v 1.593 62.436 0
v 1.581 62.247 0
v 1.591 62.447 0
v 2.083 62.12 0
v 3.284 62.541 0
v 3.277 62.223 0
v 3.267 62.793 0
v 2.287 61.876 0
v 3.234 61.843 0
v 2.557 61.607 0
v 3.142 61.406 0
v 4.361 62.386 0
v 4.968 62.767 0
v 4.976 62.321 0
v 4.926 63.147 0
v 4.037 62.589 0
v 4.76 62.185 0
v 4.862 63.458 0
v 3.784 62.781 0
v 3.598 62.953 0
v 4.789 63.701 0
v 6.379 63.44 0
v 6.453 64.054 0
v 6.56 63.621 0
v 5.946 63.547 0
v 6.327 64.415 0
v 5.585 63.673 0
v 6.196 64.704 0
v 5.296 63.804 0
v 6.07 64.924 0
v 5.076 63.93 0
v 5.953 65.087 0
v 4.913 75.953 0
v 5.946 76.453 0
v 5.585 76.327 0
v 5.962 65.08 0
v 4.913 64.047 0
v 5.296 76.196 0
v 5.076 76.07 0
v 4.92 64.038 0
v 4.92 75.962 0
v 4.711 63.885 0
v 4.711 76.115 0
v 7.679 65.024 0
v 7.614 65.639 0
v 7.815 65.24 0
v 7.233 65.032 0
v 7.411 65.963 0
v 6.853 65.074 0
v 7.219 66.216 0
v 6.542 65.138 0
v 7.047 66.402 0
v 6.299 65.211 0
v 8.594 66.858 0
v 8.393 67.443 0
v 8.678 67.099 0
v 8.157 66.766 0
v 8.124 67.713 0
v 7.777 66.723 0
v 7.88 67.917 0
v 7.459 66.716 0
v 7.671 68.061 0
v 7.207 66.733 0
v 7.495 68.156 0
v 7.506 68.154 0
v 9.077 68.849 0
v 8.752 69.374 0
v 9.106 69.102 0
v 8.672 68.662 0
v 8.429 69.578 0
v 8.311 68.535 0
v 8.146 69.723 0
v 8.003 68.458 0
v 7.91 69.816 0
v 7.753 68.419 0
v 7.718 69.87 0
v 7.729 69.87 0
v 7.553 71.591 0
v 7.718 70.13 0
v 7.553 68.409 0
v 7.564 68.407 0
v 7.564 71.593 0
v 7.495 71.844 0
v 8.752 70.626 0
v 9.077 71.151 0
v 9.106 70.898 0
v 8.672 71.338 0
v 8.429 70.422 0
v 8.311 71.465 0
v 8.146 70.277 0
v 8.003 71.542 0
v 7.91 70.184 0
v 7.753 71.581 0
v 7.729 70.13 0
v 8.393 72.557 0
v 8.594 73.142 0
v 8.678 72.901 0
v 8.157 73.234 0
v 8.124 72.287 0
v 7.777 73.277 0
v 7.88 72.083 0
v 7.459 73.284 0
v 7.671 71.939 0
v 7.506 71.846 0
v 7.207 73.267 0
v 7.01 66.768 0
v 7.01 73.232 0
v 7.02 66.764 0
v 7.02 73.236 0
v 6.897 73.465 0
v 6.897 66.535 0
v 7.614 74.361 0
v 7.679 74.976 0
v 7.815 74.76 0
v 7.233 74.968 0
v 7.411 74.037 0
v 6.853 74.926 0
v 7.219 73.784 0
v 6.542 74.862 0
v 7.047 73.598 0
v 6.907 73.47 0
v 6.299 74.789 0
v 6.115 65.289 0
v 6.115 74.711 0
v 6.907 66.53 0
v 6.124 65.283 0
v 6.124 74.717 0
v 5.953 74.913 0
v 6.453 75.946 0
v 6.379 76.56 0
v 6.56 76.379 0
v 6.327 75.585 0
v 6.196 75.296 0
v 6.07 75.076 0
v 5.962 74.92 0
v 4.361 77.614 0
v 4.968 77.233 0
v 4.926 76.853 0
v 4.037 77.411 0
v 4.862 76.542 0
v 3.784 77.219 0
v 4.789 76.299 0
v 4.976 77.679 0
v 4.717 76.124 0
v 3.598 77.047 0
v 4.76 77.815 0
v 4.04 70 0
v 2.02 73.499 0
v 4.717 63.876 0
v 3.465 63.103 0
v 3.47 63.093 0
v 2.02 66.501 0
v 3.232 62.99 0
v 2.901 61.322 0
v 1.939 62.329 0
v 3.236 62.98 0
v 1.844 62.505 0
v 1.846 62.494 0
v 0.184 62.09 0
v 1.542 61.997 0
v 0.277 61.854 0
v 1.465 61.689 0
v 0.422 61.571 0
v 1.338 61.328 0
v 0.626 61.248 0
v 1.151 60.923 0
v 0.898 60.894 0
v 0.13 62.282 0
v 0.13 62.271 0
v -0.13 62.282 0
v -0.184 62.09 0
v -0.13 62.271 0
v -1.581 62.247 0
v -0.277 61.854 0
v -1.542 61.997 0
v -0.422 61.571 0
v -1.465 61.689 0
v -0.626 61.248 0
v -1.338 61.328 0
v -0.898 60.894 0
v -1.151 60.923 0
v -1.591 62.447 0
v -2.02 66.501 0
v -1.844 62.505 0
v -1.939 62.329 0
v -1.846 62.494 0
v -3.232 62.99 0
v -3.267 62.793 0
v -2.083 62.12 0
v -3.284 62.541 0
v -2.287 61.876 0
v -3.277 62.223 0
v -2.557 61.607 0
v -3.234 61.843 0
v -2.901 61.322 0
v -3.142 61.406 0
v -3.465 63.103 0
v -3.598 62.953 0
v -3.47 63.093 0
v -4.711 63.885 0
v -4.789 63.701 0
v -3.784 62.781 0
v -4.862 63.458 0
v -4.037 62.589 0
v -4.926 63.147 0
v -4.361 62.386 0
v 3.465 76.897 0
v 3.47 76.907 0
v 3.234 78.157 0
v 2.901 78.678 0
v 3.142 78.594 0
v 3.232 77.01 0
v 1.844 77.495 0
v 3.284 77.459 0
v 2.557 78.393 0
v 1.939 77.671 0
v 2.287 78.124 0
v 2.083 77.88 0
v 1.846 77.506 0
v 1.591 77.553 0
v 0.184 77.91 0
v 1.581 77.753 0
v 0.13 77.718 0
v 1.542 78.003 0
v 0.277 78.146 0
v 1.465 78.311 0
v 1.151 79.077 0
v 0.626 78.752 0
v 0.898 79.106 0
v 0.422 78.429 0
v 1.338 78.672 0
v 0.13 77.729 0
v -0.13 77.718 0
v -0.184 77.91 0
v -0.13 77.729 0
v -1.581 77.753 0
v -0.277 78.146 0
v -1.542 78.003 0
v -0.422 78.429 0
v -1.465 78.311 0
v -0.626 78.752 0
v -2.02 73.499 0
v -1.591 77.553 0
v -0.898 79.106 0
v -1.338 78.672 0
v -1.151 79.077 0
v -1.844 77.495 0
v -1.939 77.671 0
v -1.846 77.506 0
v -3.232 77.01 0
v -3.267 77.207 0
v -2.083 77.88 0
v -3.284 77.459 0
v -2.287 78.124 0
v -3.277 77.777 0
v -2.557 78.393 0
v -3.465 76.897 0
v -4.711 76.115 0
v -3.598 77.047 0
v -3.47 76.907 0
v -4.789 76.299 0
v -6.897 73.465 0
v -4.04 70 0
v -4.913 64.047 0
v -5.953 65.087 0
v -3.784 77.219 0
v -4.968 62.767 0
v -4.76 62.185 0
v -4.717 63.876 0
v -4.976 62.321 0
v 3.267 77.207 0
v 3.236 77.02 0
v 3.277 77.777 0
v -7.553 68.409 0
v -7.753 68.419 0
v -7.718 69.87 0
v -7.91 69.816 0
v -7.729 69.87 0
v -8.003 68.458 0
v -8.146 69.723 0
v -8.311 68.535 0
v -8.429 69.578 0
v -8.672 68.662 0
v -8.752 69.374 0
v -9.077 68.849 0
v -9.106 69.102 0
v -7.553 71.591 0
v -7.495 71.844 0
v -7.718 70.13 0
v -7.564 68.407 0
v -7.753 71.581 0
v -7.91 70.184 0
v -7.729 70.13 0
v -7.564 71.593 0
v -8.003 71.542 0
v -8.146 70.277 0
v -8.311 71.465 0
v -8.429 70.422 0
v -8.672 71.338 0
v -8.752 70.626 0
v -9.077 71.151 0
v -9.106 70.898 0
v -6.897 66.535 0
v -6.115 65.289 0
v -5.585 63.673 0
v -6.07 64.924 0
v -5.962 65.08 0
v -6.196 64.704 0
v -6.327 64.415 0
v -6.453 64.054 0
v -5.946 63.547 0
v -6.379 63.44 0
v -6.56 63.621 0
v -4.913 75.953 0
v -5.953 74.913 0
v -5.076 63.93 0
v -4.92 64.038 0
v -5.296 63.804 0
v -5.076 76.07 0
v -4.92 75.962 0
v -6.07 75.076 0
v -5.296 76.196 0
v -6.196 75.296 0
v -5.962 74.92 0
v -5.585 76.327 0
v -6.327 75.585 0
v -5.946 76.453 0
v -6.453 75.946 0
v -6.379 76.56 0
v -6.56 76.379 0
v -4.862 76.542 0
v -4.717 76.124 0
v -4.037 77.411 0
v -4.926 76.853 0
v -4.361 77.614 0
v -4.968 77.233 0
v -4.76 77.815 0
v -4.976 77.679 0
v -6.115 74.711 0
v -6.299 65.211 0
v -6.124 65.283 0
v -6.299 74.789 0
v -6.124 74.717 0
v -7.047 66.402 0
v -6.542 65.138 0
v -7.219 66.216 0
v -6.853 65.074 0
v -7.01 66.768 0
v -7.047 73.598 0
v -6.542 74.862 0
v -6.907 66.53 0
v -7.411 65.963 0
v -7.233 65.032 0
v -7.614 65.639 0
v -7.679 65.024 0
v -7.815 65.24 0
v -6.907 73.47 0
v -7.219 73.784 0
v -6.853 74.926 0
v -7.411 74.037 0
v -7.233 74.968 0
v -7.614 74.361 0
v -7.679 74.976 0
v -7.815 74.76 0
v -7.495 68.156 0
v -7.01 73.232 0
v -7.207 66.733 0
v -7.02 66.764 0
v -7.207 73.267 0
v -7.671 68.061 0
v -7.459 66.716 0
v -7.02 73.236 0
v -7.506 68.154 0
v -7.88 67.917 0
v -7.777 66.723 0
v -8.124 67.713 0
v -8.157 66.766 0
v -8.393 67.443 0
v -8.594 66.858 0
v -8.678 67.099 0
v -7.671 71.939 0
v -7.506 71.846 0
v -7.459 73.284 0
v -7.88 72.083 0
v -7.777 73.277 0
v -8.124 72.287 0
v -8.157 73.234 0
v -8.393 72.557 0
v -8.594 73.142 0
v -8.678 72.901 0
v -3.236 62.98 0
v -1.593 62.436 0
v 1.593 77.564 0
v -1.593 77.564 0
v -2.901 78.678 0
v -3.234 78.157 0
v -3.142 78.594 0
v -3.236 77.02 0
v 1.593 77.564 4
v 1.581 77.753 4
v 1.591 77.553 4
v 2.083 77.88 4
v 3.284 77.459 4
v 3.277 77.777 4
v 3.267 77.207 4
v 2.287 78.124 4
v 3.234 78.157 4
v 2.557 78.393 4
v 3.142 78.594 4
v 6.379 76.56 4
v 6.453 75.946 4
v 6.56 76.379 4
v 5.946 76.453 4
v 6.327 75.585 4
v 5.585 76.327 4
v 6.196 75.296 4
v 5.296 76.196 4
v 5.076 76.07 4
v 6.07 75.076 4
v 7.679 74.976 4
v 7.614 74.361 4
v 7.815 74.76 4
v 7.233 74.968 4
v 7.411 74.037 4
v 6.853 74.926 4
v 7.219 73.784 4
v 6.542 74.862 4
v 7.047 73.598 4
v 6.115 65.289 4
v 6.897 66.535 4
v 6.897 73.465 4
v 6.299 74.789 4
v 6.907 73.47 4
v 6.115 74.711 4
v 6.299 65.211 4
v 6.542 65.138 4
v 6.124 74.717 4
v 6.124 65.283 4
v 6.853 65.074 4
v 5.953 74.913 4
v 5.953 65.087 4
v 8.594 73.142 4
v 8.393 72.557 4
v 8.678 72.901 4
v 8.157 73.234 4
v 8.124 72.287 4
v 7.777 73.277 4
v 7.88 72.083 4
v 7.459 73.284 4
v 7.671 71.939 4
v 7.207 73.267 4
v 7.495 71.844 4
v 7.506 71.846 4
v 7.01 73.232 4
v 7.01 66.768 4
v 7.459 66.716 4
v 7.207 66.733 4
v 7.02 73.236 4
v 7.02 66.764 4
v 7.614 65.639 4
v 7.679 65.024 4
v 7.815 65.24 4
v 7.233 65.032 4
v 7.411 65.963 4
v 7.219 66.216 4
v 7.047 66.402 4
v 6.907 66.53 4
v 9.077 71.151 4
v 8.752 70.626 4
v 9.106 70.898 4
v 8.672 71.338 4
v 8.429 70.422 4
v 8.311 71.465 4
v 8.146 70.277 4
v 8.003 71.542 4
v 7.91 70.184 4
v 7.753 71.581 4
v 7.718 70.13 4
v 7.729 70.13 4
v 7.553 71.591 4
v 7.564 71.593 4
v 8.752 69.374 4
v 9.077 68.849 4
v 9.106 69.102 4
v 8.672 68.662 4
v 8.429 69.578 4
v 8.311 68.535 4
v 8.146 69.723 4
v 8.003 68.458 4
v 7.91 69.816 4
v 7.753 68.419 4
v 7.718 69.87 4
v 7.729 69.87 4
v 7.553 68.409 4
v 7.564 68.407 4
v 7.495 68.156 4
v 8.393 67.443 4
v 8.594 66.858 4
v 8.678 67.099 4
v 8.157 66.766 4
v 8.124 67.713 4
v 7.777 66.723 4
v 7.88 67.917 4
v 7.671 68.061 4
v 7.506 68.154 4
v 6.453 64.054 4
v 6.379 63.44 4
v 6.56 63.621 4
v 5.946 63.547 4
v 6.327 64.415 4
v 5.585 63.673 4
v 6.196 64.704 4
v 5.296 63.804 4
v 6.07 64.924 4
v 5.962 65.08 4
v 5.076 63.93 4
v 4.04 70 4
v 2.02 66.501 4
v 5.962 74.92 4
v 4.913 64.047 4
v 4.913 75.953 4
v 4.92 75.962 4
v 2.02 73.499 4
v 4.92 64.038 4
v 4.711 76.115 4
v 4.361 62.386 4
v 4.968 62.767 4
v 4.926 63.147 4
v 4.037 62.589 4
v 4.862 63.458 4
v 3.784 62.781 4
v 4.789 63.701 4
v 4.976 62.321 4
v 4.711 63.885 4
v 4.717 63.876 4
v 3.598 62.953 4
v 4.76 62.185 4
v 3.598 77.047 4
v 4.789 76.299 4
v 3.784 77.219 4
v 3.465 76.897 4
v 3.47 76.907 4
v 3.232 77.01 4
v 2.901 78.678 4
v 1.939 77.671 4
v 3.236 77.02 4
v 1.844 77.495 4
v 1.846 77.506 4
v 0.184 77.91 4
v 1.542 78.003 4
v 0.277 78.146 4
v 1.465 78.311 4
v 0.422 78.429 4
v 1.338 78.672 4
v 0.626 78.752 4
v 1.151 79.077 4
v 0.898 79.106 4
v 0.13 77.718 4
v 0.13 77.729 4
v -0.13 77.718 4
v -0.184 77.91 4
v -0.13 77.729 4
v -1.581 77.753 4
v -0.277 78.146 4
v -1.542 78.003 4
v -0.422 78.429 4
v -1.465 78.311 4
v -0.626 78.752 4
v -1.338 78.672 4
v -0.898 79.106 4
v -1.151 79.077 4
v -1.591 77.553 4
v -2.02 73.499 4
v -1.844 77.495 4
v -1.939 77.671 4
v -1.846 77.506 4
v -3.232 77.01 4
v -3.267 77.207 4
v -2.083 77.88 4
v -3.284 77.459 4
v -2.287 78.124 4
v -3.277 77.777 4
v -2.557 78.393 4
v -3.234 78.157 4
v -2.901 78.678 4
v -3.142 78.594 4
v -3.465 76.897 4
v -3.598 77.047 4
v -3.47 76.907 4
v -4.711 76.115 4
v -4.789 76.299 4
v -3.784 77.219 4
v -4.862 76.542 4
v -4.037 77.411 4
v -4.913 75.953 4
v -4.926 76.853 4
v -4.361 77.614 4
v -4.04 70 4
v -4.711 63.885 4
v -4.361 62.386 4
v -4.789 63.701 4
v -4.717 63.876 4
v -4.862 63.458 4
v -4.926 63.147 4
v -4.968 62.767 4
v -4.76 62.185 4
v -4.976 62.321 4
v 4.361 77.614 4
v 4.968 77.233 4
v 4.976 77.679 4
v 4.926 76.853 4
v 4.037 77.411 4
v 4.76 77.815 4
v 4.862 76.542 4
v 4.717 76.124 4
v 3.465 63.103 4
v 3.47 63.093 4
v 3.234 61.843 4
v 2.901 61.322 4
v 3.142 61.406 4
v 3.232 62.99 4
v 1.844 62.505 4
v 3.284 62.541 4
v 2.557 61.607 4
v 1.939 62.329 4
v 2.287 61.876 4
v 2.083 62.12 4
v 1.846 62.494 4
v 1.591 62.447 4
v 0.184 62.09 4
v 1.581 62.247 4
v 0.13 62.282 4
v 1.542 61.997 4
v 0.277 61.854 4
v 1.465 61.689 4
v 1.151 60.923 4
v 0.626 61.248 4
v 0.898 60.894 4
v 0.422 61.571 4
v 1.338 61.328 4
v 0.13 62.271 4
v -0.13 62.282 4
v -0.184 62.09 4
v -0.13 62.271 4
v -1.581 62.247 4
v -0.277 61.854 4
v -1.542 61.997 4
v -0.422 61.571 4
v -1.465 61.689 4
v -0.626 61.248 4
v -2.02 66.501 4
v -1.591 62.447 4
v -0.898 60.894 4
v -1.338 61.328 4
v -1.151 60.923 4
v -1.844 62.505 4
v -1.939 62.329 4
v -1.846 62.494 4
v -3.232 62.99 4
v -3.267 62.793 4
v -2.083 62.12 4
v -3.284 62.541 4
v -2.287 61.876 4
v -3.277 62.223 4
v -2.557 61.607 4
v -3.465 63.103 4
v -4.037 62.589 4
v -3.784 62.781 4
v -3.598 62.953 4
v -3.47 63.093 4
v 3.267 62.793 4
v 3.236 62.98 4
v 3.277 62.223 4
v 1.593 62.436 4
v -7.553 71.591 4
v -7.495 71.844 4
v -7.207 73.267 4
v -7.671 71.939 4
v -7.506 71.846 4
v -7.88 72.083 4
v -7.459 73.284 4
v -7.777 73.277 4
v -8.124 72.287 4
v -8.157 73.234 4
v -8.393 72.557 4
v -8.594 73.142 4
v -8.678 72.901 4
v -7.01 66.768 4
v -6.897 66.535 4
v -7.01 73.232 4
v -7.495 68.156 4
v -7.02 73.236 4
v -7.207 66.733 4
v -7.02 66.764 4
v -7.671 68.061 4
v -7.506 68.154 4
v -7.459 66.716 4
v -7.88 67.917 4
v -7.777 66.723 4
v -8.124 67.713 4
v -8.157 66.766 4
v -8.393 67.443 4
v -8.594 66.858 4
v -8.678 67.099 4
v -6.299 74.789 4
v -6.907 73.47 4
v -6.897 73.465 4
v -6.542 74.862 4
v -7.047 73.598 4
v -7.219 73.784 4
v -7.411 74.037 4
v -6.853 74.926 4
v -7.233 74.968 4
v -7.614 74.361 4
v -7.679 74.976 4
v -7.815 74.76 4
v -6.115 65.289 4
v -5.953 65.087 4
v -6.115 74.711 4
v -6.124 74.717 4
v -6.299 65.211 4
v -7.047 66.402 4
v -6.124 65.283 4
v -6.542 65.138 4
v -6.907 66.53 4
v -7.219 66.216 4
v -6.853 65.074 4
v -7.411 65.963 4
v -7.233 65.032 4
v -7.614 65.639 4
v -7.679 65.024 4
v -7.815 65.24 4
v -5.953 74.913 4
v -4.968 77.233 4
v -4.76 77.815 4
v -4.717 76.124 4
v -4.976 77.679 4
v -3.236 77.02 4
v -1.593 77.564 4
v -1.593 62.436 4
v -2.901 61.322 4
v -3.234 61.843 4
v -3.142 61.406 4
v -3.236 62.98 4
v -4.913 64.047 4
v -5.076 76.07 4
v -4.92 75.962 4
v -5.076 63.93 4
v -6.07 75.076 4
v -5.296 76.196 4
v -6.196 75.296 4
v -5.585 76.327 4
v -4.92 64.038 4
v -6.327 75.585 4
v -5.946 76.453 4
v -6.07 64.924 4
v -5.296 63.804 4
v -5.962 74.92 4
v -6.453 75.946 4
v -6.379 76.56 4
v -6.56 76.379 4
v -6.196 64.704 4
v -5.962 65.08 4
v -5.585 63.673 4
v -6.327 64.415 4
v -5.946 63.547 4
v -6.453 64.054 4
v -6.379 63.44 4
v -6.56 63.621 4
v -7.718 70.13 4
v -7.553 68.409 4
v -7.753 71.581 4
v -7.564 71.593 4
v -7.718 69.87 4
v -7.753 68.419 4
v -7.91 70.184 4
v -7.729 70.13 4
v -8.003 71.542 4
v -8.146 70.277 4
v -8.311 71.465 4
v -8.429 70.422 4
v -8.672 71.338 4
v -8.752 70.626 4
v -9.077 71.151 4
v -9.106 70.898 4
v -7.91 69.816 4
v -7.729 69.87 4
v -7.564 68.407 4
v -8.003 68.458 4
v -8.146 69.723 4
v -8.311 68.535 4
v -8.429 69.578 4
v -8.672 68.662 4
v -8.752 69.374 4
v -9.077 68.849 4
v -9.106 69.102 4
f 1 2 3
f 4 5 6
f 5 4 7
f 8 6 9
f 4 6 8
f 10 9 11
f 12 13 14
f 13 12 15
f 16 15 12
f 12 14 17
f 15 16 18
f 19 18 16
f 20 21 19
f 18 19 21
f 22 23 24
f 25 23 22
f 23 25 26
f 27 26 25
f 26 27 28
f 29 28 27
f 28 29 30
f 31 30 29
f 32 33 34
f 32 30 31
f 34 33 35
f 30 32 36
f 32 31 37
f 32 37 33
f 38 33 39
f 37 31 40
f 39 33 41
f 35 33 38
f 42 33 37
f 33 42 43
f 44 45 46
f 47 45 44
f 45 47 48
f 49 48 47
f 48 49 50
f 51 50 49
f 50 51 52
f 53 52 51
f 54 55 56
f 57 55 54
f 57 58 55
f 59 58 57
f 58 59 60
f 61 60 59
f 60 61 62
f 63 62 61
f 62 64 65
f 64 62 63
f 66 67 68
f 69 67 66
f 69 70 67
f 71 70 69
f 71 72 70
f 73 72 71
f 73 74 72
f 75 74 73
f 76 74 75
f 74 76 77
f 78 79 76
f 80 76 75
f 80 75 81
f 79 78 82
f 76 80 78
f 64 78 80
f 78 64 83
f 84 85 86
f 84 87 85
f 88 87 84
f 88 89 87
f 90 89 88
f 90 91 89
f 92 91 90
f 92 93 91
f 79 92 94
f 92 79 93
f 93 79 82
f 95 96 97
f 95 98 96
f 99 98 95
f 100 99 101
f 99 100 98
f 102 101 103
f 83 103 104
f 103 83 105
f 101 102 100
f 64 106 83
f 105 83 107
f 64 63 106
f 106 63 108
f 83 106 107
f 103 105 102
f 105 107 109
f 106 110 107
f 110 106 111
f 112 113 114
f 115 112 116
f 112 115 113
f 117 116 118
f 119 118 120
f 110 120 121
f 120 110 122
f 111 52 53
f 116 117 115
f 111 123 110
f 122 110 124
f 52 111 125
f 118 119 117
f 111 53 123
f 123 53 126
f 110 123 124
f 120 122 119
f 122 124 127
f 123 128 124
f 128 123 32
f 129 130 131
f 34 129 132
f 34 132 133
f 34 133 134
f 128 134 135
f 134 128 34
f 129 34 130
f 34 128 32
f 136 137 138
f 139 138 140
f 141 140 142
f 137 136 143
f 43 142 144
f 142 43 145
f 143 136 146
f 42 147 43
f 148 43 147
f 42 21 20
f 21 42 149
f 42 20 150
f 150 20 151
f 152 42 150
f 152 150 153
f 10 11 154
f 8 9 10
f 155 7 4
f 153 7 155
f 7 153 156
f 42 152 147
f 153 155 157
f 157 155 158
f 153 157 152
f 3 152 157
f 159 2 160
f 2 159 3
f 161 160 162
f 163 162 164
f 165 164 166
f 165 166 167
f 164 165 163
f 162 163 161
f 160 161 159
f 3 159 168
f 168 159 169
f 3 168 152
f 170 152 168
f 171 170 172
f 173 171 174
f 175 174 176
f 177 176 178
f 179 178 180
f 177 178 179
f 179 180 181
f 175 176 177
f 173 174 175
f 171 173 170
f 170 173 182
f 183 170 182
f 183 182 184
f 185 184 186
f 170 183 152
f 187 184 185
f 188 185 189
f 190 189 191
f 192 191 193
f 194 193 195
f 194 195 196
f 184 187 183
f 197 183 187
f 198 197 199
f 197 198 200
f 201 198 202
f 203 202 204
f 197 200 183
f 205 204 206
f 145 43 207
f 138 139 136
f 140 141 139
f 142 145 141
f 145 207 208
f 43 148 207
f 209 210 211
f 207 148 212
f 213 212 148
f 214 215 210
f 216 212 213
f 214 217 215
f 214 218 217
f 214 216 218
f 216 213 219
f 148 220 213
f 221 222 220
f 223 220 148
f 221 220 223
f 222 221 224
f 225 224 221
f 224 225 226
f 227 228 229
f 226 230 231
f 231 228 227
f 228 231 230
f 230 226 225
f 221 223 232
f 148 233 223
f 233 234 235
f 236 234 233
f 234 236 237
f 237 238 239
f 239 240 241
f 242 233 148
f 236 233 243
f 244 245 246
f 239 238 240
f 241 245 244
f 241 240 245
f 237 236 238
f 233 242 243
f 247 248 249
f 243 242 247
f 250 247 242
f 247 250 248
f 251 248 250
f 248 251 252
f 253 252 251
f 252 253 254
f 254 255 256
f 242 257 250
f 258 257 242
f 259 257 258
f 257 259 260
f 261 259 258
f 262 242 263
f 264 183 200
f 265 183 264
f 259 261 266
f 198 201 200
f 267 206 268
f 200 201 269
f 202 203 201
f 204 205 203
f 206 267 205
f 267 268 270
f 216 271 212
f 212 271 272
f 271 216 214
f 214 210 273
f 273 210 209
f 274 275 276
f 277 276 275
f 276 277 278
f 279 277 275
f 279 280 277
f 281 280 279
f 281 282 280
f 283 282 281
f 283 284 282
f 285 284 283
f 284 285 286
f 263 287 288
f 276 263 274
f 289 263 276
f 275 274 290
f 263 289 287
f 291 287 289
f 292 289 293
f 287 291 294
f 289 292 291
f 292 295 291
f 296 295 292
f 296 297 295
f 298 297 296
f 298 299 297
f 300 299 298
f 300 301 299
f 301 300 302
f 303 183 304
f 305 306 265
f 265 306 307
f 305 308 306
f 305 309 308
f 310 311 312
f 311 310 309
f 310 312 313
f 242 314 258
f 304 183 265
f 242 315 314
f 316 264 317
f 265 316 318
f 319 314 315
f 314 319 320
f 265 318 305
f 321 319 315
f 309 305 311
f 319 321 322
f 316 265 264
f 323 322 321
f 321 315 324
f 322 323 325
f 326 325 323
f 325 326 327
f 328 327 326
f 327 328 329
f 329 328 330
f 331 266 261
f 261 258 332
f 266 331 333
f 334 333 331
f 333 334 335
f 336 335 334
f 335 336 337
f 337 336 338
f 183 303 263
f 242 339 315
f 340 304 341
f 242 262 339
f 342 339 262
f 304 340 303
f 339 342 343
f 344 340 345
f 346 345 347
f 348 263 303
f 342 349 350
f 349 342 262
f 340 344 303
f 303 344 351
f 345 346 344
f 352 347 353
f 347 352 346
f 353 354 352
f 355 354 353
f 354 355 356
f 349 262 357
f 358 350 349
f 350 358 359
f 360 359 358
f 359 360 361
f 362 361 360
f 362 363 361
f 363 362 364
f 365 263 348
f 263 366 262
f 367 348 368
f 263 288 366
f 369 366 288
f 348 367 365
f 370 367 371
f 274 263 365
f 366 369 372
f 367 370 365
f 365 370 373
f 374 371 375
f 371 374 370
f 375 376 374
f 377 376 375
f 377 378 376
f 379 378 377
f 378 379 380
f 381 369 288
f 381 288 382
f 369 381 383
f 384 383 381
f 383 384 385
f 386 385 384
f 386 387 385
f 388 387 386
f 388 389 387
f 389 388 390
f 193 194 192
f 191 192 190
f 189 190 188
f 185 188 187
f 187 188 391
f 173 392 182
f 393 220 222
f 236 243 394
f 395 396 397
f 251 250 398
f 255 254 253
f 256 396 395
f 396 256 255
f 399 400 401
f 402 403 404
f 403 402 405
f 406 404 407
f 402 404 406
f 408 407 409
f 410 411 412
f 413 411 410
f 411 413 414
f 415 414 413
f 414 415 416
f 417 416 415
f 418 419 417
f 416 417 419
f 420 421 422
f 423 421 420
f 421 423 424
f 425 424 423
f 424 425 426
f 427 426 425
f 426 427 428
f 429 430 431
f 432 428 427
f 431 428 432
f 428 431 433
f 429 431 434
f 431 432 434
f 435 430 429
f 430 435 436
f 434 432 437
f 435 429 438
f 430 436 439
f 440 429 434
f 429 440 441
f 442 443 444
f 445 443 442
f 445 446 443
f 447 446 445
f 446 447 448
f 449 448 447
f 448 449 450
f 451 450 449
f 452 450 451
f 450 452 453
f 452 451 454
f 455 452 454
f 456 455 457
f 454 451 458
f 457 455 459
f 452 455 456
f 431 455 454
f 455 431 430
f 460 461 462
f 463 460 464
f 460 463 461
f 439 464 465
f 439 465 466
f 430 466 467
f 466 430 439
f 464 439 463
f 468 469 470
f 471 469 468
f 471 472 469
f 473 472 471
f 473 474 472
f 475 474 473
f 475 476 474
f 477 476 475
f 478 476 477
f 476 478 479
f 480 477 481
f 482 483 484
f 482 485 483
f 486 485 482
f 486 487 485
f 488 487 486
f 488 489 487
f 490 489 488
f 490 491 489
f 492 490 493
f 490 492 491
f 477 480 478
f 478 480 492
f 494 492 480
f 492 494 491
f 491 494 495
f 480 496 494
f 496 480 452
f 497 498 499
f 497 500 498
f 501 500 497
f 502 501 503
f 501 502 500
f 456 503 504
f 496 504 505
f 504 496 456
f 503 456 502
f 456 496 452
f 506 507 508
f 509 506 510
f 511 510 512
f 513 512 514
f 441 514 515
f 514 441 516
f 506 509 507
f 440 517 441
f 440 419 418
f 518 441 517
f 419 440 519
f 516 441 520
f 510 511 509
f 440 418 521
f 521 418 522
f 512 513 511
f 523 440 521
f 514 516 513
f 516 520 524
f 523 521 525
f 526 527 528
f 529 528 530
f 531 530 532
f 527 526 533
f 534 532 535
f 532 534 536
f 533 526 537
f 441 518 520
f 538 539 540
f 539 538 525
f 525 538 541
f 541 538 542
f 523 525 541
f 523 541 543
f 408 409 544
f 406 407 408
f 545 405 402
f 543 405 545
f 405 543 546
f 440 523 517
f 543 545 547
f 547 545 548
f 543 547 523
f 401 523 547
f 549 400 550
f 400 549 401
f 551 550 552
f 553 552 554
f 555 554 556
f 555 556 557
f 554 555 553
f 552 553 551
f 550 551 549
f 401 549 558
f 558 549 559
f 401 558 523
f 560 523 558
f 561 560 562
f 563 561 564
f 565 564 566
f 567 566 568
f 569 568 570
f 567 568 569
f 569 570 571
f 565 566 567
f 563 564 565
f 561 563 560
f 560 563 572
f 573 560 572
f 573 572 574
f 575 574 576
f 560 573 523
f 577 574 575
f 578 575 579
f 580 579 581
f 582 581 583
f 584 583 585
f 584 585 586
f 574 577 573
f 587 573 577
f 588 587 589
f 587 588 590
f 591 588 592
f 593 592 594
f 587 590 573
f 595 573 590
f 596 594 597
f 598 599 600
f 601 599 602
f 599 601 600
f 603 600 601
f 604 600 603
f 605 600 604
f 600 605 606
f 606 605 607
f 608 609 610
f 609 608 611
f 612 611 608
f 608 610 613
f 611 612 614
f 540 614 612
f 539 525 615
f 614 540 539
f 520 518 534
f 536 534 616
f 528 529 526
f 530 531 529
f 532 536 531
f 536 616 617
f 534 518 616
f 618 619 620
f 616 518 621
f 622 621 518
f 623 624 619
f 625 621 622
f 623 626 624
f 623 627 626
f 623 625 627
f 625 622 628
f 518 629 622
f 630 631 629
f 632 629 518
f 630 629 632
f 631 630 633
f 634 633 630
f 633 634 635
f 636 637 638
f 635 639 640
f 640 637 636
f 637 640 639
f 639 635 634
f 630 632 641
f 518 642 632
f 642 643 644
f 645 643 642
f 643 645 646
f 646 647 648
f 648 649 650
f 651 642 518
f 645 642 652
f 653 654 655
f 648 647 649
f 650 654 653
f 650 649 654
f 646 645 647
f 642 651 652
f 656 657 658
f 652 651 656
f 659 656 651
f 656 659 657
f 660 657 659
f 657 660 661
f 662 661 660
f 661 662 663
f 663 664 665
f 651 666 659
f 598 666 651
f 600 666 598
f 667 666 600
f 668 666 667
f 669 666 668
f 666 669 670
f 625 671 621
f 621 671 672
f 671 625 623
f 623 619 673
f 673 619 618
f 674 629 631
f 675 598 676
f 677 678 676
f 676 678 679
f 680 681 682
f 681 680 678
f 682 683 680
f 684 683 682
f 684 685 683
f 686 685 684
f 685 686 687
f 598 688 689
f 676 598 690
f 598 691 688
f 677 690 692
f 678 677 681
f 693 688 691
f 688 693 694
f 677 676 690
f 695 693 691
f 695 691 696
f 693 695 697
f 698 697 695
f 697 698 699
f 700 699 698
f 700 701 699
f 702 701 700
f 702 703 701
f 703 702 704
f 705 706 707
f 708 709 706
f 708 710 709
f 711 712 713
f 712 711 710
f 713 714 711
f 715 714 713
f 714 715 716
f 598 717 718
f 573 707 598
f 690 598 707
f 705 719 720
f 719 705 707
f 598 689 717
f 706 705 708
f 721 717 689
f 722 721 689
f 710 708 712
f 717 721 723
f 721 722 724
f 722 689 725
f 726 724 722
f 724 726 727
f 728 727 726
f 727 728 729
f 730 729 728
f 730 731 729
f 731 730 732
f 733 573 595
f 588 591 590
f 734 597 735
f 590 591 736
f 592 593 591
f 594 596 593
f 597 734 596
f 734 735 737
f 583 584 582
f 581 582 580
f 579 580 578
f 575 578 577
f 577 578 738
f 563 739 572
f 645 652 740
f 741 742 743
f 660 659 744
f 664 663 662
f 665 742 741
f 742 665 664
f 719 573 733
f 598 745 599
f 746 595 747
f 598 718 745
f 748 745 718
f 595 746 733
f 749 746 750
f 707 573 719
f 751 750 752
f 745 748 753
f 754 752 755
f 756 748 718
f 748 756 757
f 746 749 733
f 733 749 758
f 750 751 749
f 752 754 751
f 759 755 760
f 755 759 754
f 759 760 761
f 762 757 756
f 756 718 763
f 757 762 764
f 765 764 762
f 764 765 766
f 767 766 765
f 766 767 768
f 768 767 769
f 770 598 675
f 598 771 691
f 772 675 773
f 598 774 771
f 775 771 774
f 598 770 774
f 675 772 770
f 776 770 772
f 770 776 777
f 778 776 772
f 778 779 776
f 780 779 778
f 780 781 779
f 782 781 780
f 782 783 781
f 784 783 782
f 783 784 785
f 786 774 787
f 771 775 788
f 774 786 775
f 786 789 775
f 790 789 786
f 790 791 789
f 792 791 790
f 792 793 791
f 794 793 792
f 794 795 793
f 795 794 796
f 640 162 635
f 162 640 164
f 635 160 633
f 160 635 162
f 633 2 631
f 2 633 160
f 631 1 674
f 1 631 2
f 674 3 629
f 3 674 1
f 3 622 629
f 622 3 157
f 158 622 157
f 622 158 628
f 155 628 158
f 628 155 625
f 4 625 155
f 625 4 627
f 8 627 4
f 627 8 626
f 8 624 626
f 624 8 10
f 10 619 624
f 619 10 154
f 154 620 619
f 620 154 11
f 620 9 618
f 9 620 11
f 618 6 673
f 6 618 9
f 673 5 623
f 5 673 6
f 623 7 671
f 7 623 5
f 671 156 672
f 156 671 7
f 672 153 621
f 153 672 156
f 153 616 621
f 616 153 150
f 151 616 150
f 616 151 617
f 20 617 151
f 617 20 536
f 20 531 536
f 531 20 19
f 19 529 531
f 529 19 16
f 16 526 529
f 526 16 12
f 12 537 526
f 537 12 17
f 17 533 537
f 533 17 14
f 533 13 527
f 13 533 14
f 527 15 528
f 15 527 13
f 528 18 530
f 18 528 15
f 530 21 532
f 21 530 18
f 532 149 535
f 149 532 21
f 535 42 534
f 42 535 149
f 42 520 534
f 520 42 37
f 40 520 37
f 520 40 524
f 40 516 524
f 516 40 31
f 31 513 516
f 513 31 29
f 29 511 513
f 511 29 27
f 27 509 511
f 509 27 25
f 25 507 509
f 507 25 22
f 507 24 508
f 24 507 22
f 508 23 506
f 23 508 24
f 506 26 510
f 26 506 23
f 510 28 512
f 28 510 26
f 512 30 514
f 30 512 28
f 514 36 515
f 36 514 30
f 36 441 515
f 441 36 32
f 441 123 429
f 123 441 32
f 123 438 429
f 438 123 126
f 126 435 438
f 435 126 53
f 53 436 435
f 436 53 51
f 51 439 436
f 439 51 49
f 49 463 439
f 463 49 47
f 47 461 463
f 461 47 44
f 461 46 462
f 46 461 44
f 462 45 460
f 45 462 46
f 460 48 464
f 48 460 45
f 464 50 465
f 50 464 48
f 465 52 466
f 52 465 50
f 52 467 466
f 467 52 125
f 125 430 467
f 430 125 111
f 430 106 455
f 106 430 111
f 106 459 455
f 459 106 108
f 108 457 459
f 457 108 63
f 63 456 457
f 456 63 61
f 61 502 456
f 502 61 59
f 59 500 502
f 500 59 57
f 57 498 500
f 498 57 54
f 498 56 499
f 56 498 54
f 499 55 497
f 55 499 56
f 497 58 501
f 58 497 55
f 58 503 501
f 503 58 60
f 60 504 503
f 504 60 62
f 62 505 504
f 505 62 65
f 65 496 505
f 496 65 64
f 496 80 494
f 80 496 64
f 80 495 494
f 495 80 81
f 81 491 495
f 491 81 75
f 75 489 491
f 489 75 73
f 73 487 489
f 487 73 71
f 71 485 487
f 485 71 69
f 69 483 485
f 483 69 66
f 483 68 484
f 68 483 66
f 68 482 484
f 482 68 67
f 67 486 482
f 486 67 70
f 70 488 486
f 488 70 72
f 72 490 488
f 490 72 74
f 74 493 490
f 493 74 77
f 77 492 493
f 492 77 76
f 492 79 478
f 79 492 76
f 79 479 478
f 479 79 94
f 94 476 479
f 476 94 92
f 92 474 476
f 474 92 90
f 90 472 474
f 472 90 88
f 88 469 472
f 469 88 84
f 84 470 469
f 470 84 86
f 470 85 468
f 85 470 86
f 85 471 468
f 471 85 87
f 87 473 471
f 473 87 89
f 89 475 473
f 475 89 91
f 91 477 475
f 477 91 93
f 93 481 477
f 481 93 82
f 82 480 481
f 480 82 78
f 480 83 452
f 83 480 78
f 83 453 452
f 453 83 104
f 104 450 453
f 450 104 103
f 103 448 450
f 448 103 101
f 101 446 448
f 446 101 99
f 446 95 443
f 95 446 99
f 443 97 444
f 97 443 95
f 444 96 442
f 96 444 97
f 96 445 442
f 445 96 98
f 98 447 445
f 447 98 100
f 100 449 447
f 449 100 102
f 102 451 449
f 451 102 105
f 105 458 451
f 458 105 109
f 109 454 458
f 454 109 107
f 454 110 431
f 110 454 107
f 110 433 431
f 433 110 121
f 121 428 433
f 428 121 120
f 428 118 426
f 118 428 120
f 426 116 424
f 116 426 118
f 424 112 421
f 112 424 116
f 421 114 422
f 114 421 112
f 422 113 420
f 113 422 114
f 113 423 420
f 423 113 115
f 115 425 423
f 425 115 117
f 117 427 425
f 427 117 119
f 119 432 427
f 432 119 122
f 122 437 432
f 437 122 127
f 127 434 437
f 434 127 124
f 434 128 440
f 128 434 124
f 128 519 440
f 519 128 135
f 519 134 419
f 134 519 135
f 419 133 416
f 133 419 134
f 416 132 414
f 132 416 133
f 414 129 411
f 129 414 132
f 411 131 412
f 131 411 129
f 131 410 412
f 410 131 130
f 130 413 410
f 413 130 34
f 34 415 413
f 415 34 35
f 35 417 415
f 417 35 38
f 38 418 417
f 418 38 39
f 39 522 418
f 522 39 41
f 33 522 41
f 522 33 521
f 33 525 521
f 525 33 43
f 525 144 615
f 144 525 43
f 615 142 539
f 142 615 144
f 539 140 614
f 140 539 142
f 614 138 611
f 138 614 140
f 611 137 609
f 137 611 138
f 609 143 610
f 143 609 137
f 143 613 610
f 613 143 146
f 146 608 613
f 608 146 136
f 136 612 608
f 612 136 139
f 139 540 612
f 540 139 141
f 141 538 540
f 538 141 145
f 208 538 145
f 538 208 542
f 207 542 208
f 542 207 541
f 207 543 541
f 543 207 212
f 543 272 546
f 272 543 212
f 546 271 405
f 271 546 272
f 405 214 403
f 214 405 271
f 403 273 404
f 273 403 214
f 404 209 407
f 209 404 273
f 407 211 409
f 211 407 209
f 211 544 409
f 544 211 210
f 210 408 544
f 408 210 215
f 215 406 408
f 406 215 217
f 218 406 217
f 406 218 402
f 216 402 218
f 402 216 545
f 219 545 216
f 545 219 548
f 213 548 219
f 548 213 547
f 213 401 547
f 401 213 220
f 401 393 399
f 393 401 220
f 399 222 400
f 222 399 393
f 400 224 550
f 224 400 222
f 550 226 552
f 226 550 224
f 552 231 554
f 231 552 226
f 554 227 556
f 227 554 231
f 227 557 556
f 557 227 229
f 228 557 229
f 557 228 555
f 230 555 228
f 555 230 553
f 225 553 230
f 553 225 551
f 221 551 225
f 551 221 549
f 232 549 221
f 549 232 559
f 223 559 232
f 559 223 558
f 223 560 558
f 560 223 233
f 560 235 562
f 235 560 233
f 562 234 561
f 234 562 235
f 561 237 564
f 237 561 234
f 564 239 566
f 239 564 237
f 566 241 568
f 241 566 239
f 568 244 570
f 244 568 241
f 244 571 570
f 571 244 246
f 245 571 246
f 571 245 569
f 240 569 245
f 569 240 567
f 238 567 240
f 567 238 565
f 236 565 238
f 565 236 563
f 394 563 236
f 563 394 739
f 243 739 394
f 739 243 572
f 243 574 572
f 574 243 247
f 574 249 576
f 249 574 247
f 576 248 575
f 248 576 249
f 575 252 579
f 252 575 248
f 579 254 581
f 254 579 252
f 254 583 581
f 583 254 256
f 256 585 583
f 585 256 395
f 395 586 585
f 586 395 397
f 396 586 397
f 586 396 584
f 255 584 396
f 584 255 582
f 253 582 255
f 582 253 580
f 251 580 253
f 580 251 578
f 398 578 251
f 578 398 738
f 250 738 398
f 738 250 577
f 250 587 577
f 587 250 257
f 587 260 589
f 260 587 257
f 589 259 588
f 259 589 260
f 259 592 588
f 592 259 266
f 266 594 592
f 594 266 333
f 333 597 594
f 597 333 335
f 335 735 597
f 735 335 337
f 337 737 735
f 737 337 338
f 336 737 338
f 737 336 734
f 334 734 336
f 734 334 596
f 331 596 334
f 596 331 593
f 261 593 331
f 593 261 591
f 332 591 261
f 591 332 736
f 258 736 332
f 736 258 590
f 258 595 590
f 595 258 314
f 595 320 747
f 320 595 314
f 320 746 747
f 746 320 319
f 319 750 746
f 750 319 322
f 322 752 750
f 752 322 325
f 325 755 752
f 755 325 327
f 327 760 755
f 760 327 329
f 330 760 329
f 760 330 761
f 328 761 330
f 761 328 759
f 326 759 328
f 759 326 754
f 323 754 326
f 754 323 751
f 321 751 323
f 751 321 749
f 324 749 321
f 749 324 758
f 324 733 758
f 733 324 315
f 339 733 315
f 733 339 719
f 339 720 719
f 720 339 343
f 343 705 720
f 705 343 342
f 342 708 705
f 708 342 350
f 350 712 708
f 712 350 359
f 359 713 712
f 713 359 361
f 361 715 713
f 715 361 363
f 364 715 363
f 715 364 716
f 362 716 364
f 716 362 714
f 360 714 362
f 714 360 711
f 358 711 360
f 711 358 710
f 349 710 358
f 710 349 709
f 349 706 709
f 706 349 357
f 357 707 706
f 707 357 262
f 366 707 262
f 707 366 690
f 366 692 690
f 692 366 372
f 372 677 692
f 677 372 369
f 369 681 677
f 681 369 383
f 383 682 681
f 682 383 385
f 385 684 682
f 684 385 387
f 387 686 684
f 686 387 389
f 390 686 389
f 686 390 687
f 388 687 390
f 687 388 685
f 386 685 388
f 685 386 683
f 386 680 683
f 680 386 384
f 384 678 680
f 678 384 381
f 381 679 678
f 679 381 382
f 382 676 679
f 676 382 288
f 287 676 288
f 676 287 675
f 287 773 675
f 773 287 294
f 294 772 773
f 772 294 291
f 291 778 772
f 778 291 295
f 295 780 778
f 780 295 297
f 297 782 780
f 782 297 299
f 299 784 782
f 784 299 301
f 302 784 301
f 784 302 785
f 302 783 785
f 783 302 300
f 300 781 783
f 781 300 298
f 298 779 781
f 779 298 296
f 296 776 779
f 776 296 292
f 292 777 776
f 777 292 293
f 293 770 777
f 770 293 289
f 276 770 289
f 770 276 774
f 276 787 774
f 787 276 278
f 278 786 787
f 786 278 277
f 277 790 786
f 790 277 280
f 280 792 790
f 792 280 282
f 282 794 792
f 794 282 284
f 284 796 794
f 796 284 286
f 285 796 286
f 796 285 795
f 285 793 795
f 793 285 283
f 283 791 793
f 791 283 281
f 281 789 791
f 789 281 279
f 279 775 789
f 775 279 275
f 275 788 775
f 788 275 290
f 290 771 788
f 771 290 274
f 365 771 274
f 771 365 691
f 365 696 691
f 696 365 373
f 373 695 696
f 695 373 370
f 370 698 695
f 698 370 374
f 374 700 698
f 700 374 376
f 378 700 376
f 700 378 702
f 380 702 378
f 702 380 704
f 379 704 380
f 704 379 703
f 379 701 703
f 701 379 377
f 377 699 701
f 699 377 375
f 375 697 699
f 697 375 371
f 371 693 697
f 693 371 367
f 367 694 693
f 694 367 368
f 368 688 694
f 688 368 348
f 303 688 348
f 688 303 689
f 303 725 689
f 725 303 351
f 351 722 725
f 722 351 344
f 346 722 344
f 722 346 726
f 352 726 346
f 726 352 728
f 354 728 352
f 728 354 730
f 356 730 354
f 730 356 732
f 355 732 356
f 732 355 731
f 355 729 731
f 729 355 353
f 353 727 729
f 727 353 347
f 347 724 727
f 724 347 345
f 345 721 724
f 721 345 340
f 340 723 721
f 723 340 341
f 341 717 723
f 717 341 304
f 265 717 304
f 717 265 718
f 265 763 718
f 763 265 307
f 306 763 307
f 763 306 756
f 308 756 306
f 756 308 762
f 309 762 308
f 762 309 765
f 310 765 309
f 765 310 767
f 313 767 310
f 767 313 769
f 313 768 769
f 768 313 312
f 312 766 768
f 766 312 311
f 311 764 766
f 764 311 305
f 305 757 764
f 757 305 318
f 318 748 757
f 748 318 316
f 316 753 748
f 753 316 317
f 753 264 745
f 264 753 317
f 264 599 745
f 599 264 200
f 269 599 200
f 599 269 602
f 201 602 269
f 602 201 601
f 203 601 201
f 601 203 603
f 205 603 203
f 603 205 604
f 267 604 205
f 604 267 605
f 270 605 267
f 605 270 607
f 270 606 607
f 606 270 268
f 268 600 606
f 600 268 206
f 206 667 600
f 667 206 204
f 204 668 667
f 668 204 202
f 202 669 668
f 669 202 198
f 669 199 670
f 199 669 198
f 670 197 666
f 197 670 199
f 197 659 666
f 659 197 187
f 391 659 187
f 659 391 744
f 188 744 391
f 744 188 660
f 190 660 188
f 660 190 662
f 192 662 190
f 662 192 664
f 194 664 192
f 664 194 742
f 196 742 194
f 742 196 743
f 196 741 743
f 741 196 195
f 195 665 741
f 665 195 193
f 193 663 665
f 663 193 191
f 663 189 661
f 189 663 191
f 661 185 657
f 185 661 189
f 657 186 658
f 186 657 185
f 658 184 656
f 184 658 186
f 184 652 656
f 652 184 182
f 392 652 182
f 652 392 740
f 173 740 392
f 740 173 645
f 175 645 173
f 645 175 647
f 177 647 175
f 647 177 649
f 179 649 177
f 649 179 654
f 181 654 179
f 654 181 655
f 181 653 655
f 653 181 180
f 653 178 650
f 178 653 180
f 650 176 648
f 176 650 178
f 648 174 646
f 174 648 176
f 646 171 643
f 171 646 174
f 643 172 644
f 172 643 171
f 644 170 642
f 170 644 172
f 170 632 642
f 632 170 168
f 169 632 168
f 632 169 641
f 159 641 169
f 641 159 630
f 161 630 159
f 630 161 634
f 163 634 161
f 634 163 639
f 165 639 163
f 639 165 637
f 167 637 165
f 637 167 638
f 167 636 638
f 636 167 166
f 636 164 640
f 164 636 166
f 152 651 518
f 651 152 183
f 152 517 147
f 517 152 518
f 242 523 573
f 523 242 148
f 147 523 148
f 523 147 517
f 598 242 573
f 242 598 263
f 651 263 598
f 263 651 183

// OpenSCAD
// file: ModuleKatzenklappe.scad
// //////////////////////////////////
// Module für Katzenklappenverschluss
// //////////////////////////////////

module armHorn (laenge, breite, dicke) {
    difference() {
    union() {
    translate ([0,-breite/2,0])
    cube([laenge,breite,dicke], false);
    translate ([laenge,0,0])
    cylinder(dicke,r=breite/2, false); 
    }
    translate ([laenge*1.0,0,0])
    loch(radius=2,tiefe= dicke + 1);
/*    translate ([laenge*0.6,0,dicke-1])
    letter("Achim");
    translate ([laenge*0.6,0,1])
    rotate([0,180,0])
    letter("Tim");
    translate ([laenge*0.2,0,0])
    loch(radius=2,tiefe= dicke + 1);
*/    }
};

module mittelRad (breite) {
    difference() {
        cylinder(breite,r=12.5, false);
        cylinder(breite,r=2.0, false);
        
/*        translate([0,0,breite])
        gear (
            toothNo = 100, 
            toothWidth = 1, 
            toothHeight  = 2, 
            thickness = breite,
            holeRadius = 5,
            holeSides = 6
        );
        translate ([-25,0,0])
        loch(radius=5,tiefe=breite + 1);
        translate ([25,0,0])
        loch(radius=5,tiefe=breite + 1);
        translate ([0,-25,0])
        loch(radius=5,tiefe=breite + 1);
        translate ([0,25,0])
        loch(radius=5,tiefe=breite + 1);
*/        } 
};

module loch (radius, tiefe) {
        cylinder(tiefe,r=radius, false);   
};

module zapfen (breite,tiefe) {
        cube([breite,breite,tiefe], true);   
};

module wand (breite) {
    difference() {
        cube([breite,120,5], false);  
        translate ([5,5,0])
        cube([breite/3-10,110,5], false);  
        translate ([breite/3+5,5,0])
        cube([breite/3-10,110,5], false);  
        translate ([2*breite/3+5,5,0])
        cube([breite/3-10,110,5], false);  
    } 
};

module lArm(laenge, breite, dicke) {
    difference() {
        union() {
            armHorn(laenge=laenge, breite=breite, dicke=dicke);
            rotate(90) armHorn(laenge=laenge, breite=breite, dicke=dicke);
            cylinder(dicke,r=breite/2, false); 
           }
            translate ([0,0,0])
            zapfen(breite= 3, tiefe = dicke * 2);
        }
};

module mittelAchse(laenge, radius_achse, zapfen_breite, zapfen_laenge, breite) {
    difference() {
        union() {
            translate ([0,0,zapfen_laenge /2])
            zapfen(breite= zapfen_breite, tiefe=zapfen_laenge);   
            translate ([0,0,zapfen_laenge])
            cylinder(laenge,r = radius_achse, false, $fn=6);
            translate ([0,0,laenge+(1.5*zapfen_laenge)])
            zapfen(breite= zapfen_breite, tiefe=zapfen_laenge);   
        }
        cylinder (laenge+6,r=0.9, false);
    }
};

module achse(laenge, radius_achse) {
    difference() {
        cylinder(laenge,r = radius_achse, false, $fn=6);
        cylinder (laenge+6,r=0.9, false);
    }
};


module tooth(width, thickness, height){
  scale([width/5,thickness/5,height/10]){
    difference(){
      translate([-2.5,0,0])
      cube([5,5,10]);
      translate([5+1.25-2.5,0-1,0])
      rotate([0,-14.0362434,0])
        cube([5,5+2,12]);
      translate([0-1.25-2.5,0+5+1,0])
      rotate([0,-14.0362434,180])
        cube([5,5+2,12]);
    }
  }
}
module gear(toothNo, toothWidth, toothHeight, thickness,holeRadius,holeSides){
  radius = (toothWidth*1.7*toothNo)/3.141592653589793238/2;
  rotate([-90,0,0])
  difference(){
    union(){
      for(i=[0:toothNo]){
        rotate([0,(360/toothNo)*i,0])
        translate([0,0,radius-0.5])
          tooth(toothWidth,thickness,toothHeight);
      }
      translate([0,thickness,0])
      rotate([90,0,0])
        cylinder(r=radius, h=thickness);
    }
  translate([0,thickness+1,0])
  rotate([90,0,0])
    cylinder(r=holeRadius,h=thickness+2,$fn=holeSides);
  }
}

font = "Liberation Sans";


letter_size = 5;
letter_height = 3;


module letter(l) {
  // Use linear_extrude() to make the letters 3D objects as they
  // are only 2D shapes when only using text()
  linear_extrude(height = letter_height) {
    text(l, size = letter_size, font = font, halign = "center", valign = "center", $fn = 16);
  }
}


module 9g_motor(){
	difference(){			
		union(){
			color("SteelBlue") cube([23,12.5,22], center=true);
			color("SteelBlue") translate([0,0,5]) cube([32,12,2], center=true);
			color("SteelBlue") translate([5.5,0,2.75]) cylinder(r=6, h=25.75, $fn=20, center=true);
			color("SteelBlue") translate([-.5,0,2.75]) cylinder(r=1, h=25.75, $fn=20, center=true);
			color("SteelBlue") translate([-1,0,2.75]) cube([5,5.6,24.5], center=true);		
			color("white") translate([5.5,0,3.65]) cylinder(r=2.35, h=29.25, $fn=20, center=true);				
		}
		translate([10,0,-11]) rotate([0,-30,0]) cube([8,13,4], center=true);
		for ( hole = [14,-14] ){
			translate([hole,0,5]) cylinder(r=2.2, h=4, $fn=20, center=true);
		}	
	}
}

module sg90() {
	color("blue") difference() {
		union() {
			translate([0,0,22.5/2]) cube([22.5,12.2,22.5], center=true);
			translate([0,0,16.75]) cube([32.2,12.2,2], center=true);

			translate([0,0,22.5-1]) {
				hull() {
					translate([-1,0,0]) cylinder(d=5.5, h=4+1);
					translate([1,0,0]) cylinder(d=5.5, h=4+1);
				}

				translate([5.5,0,0]) cylinder(d=11.6, h=4+1);
			}

		}	

		translate([-32.5/2+2,0,16.75-2]) {
			cylinder(d=2, h=2+2);
			translate([-2,0,2]) cube([4,1,2+2], center=true);
		}
		translate([32.5/2-2,0,16.75-2]) {
			cylinder(d=2, h=2+2);
			translate([2,0,2]) cube([4,1,2+2], center=true);
		}
	}
	color("white") translate([5.5,0,22.5-1+4]) {
		difference() {
			cylinder(d=4.8, h=3+1);
			translate([0,0,1]) cylinder(d=2, h=4);
		}
	}
}

module stuetze (hoehe) {
    difference() {
        translate ([0,0,0])
        cube([hoehe,20,3], false);
        translate ([hoehe*0.8,10,0])
        cylinder(21,r=1.5, center=true);
        translate ([hoehe*0.7,10,0])
        cylinder(21,r=1.5, center=true);
        translate ([hoehe*0.6,10,0])
        cylinder(21,r=1.5, center=true);
        translate ([hoehe*0.5,10,0])
        cylinder(21,r=1.5, center=true);
    }
}

module balken (laenge) {
    difference() {
        translate ([0,-10,0])
        cube([5,laenge,3], false);
    }
/*    translate ([2.5,25,2.5])
        rotate(-90,90,0)
        letter("Design by Achim & Tim 2018");    
*/
}

module boden(laenge, breite) {
    difference() {
        cube([5,laenge,breite], false);
        rotate([0,90,0])
        translate ([-breite/2,laenge*0.1,0])
        cylinder(6,r=1.5, center=false);
        rotate([0,90,0])
        translate ([-breite/2,laenge*0.5,0])
        cylinder(6,r=1.5, center=false);
        rotate([0,90,0])
        translate ([-breite/2,laenge*0.9,0])
        cylinder(6,r=1.5, center=false);
    }
}

module wand(hoehe, anzahl, abstand) {
    for (a =[0:abstand:anzahl*abstand])
        translate ([0,a,0])
        stuetze(hoehe);
    translate ([0,10,0])
    balken(anzahl*abstand);
    translate ([hoehe-5,10,0])
    balken(anzahl*abstand);
}

module halterung(hoehe) {
    // Bodenplatte
    cube([5,22,36],false);
    difference(){
        // Motorhalterung
        cube([hoehe,22,15.5],false);
        translate ([hoehe-5,10,11])
        cylinder(6,r=0.5, center=false);
        translate ([10,10,11])
        cylinder(6,r=0.5, center=false);
    }
}
// main file
include <ModuleKatzenklappe.scad>;
include <gears.scad>;

zahnradabstand = 25;
gehaeusehoehe = 45;

// Maße eines L-Arms
lArmBreite  = 10;
lArmLaenge  = 18;
lArmDicke   = 3;

// Maße der Mittelachse
mittelAchseLaenge       = 21;
mittelAchseRadius       = 4;
mittelAchseZapfenBreite = 2.6;
mittelAchseZapfenLaenge = 3;
mittelAchseRadBreite    = 5;

// Zahnrad 3


difference() {
    translate ([0,70,0])
    rotate([0,0,1/56*360])
    gear (number_of_teeth=28,
			circular_pitch=109.8,
            hub_diameter=7,
            bore_diameter=1.8,
			rim_width=2,
			rim_thickness=4,
			gear_thickness=4,
			hub_thickness=4,
			circles=0);
    translate ([0,70,-10])
    scale (1.01) mittelAchse(laenge = mittelAchseLaenge, radius_achse =     mittelAchseRadius, zapfen_breite = mittelAchseZapfenBreite, zapfen_laenge = mittelAchseZapfenLaenge, breite = mittelAchseRadBreite);
    translate ([0,70,-10])
    cylinder(20,r=2,true);
}


/*
// Verschluss
translate([gehaeusehoehe*0.7,10,0])


// Verschlussriegel unten
lArm(laenge=lArmLaenge,breite=lArmBreite,dicke=lArmDicke);

translate([0,0,0])
// Mittelachse
mittelAchse(laenge = mittelAchseLaenge, radius_achse = mittelAchseRadius, zapfen_breite = mittelAchseZapfenBreite, zapfen_laenge = mittelAchseZapfenLaenge, breite = mittelAchseRadBreite);
    
// Verschlussriegel oben
//        translate ([0,0,mittelAchseLaenge+lArmDicke])
rotate(-90) lArm(laenge=lArmLaenge,breite=lArmBreite,dicke=lArmDicke);

translate ([70,70,3.3])
rotate([0,-90,0]) 
rotate([0,0,30]) 
achse(laenge = 10, radius_achse = mittelAchseRadius);

*/
